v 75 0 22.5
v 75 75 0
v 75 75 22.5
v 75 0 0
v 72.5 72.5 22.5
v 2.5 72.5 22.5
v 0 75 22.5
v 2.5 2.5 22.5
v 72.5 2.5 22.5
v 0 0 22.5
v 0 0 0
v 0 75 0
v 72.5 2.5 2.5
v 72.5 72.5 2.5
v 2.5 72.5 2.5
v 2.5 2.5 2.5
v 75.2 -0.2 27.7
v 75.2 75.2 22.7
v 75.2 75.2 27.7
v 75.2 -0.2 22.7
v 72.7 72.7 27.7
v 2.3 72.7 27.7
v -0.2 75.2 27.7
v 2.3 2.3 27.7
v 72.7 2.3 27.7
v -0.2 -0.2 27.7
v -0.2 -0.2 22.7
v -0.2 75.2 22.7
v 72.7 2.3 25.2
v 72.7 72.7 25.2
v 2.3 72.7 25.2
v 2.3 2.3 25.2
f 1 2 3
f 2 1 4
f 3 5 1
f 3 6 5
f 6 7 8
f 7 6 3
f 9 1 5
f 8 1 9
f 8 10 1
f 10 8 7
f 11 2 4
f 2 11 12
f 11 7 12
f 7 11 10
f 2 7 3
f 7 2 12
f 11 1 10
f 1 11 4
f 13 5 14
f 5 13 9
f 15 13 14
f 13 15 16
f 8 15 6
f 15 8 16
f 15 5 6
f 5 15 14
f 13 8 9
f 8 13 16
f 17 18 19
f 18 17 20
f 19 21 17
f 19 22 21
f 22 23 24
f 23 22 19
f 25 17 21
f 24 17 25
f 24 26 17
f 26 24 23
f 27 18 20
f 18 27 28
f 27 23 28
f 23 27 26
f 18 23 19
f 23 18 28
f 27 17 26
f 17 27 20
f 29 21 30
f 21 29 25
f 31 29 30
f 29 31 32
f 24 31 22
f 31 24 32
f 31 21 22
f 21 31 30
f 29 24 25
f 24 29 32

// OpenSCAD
// Two-part printable enclosure with 70x70x20 mm minimum cavity and 2.5 mm wall thickness

// -------------------- Parameters --------------------
inner_x = 70;
inner_y = 70;
inner_h = 20;

wall = 2.5;
floor_thickness = 2.5;
nominal_clearance = 0.20;

// -------------------- Derived dimensions --------------------
base_outer_x = inner_x + 2 * wall;
base_outer_y = inner_y + 2 * wall;
base_outer_z = floor_thickness + inner_h;   // 22.5 mm

lid_outer_x = base_outer_x + 2 * nominal_clearance;
lid_outer_y = base_outer_y + 2 * nominal_clearance;
lid_base_thickness = wall;                  // 2.5 mm bottom plate
lid_wall_height = 2.5;                      // 2.5 mm side wall height
lid_outer_z = lid_base_thickness + lid_wall_height; // 5.0 mm

// -------------------- Parts --------------------
module enclosure_base() {
    difference() {
        cube([base_outer_x, base_outer_y, base_outer_z]);
        translate([wall, wall, floor_thickness])
            cube([inner_x, inner_y, inner_h]);
    }
}

module enclosure_lid() {
    difference() {
        cube([lid_outer_x, lid_outer_y, lid_outer_z]);
        translate([wall, wall, lid_base_thickness])
            cube([
                inner_x + 2 * nominal_clearance,
                inner_y + 2 * nominal_clearance,
                lid_wall_height
            ]);
    }
}

// -------------------- Assembly (separate, non-interfering, with clearance) --------------------
translate([0, 0, 0])
    color("lightsteelblue", 0.7)
    enclosure_base();

translate([
    -(lid_outer_x - base_outer_x) / 2,
    -(lid_outer_y - base_outer_y) / 2,
    base_outer_z + nominal_clearance
])
    color("lightgray", 0.7)
    enclosure_lid();
